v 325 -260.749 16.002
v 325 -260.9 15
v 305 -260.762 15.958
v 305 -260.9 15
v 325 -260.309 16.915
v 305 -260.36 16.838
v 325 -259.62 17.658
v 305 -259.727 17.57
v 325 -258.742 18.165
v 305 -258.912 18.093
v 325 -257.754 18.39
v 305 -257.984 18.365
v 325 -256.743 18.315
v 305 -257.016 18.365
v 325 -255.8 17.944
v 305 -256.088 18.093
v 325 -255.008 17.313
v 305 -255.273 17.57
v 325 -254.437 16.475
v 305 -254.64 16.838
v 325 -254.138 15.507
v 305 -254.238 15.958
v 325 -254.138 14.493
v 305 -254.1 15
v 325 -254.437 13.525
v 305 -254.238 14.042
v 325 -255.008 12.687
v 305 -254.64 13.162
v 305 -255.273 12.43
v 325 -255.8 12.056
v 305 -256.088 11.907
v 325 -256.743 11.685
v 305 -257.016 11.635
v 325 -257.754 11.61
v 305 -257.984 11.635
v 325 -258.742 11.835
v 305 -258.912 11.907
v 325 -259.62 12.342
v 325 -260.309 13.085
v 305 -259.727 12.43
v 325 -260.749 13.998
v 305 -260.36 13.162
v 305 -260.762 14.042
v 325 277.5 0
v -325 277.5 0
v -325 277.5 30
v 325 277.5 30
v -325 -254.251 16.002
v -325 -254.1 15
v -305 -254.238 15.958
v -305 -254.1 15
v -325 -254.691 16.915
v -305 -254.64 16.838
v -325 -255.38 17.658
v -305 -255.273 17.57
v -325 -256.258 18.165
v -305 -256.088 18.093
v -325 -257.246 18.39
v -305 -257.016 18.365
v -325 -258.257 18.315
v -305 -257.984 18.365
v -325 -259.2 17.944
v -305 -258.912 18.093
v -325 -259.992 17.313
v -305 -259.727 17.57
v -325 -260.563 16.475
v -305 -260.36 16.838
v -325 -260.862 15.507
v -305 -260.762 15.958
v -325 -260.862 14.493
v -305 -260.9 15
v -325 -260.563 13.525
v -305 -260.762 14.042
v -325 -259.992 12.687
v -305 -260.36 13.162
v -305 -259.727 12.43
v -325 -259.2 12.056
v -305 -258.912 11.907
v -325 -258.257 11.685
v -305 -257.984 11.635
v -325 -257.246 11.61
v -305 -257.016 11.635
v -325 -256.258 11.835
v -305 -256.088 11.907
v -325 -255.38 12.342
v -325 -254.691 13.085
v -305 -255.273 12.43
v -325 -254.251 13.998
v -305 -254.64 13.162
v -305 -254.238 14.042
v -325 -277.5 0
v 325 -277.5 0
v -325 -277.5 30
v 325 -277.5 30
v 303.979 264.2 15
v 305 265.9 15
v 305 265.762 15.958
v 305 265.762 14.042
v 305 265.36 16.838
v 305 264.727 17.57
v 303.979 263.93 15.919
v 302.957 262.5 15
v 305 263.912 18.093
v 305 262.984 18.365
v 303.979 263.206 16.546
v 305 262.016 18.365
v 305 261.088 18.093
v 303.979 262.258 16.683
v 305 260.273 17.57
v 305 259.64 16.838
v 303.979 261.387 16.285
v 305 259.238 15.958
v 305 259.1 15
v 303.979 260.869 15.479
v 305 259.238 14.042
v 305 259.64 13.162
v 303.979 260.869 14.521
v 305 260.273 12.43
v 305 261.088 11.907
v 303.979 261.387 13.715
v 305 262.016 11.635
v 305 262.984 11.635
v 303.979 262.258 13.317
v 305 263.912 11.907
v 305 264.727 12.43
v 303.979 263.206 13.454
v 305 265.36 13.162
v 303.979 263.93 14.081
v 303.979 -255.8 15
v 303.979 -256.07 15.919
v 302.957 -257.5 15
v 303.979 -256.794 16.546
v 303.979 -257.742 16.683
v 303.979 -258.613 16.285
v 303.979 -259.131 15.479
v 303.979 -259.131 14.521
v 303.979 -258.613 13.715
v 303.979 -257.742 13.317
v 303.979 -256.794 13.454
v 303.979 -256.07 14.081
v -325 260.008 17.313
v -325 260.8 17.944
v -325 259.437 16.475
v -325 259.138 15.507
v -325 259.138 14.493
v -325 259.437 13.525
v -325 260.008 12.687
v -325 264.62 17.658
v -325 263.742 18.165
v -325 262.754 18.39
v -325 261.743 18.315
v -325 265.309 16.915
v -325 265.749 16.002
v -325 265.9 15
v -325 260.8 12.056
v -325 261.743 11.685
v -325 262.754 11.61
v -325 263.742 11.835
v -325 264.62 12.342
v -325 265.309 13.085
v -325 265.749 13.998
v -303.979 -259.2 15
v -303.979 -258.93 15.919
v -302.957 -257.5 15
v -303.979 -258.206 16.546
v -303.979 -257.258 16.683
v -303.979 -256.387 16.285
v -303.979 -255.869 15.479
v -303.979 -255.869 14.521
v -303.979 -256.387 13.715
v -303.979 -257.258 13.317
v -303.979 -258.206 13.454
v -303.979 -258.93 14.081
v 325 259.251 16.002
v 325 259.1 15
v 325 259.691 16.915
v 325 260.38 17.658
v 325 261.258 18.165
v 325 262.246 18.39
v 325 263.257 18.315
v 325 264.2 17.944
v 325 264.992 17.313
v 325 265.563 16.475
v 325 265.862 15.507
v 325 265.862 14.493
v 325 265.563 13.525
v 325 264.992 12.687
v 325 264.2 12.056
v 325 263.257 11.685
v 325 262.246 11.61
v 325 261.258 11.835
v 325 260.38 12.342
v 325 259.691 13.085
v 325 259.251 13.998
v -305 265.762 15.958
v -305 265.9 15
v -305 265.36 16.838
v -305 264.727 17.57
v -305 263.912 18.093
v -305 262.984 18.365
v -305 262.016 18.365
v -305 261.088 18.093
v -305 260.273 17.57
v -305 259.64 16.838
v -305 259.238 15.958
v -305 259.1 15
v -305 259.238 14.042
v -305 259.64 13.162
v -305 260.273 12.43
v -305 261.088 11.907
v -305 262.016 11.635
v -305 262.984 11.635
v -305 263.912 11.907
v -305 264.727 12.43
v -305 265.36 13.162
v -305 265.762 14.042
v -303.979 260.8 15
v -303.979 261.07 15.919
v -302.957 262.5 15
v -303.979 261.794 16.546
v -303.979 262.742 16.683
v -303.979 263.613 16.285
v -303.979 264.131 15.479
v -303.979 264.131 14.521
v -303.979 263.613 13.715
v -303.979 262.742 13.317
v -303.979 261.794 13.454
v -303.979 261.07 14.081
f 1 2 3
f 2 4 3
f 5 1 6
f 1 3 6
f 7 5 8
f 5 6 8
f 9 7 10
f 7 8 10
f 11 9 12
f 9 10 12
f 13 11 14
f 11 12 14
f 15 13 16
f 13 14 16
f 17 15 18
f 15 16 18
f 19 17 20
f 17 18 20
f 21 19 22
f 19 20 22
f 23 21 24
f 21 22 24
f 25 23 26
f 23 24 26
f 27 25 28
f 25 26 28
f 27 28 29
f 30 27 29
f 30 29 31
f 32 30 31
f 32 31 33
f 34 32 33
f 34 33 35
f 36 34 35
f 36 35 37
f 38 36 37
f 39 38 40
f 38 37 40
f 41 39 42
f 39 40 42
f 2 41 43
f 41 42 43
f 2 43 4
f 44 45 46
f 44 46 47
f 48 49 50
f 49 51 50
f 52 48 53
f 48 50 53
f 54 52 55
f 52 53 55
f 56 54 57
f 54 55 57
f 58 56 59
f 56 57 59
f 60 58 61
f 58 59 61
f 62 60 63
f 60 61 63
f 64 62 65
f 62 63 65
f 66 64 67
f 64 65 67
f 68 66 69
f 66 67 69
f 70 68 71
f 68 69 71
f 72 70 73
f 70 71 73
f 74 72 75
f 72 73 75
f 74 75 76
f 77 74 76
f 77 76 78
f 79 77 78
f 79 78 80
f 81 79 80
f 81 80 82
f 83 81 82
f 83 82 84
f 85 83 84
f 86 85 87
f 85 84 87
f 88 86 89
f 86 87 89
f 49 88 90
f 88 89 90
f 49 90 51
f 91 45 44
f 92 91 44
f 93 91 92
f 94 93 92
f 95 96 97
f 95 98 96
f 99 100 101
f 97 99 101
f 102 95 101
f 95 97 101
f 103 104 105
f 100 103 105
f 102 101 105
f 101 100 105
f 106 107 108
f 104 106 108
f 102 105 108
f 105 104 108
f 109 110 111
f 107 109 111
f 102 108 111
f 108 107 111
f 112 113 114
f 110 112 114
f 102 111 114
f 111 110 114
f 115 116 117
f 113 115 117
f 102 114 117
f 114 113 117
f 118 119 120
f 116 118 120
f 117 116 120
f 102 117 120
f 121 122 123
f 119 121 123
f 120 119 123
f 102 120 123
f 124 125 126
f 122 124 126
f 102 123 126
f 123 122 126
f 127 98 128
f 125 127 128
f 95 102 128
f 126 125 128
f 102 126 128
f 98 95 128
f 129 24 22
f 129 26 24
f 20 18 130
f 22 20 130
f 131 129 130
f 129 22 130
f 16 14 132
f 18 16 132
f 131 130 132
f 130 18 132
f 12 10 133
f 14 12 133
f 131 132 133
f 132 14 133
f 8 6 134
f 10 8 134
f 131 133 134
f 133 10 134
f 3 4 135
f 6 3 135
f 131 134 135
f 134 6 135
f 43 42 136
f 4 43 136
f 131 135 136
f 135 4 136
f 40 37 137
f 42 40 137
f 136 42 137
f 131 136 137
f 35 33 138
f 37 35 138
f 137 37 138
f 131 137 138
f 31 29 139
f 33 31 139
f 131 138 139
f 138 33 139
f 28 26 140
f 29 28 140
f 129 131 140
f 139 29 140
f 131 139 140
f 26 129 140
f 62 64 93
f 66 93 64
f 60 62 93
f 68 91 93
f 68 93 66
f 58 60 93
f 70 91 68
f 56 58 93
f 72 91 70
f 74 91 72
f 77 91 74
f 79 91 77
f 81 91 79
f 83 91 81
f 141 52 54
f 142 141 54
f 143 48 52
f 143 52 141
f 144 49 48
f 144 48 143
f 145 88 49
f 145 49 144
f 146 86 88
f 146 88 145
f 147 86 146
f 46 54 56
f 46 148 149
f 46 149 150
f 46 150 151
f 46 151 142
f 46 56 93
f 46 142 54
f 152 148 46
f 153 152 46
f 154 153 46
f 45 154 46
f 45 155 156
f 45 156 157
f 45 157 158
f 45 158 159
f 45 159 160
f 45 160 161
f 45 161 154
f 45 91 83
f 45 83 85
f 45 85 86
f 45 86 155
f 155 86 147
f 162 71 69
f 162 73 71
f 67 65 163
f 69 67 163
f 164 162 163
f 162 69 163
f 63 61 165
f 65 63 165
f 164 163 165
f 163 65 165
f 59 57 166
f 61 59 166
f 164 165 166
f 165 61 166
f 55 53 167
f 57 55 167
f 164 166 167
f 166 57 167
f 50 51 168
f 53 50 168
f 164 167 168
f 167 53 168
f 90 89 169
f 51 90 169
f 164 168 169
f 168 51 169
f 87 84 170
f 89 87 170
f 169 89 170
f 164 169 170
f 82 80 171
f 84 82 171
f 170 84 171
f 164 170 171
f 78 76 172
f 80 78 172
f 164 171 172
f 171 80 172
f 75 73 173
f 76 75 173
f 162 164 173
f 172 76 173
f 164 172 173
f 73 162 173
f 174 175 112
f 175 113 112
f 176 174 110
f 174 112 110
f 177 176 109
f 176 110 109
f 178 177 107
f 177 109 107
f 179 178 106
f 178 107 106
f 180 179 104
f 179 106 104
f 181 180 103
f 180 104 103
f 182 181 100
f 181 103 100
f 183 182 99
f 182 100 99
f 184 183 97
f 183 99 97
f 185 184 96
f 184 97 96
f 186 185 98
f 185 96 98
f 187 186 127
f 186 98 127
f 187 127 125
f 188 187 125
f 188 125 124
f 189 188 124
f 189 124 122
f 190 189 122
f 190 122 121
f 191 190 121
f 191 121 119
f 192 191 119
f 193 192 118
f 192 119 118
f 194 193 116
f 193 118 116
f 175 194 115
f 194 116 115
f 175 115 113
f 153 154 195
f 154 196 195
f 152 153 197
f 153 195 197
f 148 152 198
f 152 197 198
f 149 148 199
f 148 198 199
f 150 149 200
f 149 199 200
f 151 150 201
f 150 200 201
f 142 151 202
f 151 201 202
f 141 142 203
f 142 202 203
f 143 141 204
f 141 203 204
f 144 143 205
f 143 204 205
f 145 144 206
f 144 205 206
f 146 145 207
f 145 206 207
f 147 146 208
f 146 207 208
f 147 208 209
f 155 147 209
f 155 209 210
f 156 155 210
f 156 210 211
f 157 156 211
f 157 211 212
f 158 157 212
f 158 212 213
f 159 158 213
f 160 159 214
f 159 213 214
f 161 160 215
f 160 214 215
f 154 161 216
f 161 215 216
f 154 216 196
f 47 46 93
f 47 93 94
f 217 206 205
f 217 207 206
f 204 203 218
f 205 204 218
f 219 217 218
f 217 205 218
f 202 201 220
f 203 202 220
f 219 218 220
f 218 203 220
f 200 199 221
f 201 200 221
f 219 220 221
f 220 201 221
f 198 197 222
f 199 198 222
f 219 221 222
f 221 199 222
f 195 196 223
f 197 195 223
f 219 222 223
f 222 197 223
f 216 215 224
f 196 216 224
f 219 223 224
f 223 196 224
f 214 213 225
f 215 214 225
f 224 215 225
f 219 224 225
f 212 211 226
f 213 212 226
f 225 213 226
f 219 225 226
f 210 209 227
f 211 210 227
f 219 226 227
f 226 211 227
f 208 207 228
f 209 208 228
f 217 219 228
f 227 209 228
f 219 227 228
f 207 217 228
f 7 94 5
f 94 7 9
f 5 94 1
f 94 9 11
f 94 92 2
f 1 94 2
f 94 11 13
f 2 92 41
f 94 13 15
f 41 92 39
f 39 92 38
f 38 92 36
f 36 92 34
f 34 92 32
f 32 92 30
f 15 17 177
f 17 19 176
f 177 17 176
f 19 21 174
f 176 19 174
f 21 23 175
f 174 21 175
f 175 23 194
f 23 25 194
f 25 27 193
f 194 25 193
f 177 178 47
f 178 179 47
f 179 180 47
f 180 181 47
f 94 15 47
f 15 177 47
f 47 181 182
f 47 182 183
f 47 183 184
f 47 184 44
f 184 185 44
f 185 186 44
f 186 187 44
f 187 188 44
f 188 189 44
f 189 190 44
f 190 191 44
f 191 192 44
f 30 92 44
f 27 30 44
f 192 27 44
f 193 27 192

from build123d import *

# Parameters (mm, degrees)
F0_W           = 650
F0_H           = 555
F1_DEPTH       = 30
F4_D           = 6.8
F4_DEPTH       = 20
F4_TIP         = 2.0429261047
F4_ON_F3_D     = 6.8
F4_ON_F3_DEPTH = 20
F4_ON_F3_TIP   = 2.0429261047


with BuildPart() as f1:
    # F0 (on Top) → F1 (new body)
    with BuildSketch(Plane.XY):
        Rectangle(F0_W, F0_H)
    extrude(amount=F1_DEPTH)

    # F4
    with Locations(Plane(origin=(-325, 0, 0), x_dir=(0, -1, 0), z_dir=(-1, 0, 0))):
        with Locations((257.5, 15), (-262.5, 15)):
            Hole(F4_D / 2, depth=F4_DEPTH)
            with Locations((0, 0, -(F4_DEPTH + F4_TIP / 2))):  # 118° drill point
                Cone(0, F4_D / 2, F4_TIP, mode=Mode.SUBTRACT)

    # F4 on F3
    with Locations(Plane.YZ.offset(325)):
        with Locations((262.5, 15), (-257.5, 15)):
            Hole(F4_ON_F3_D / 2, depth=F4_ON_F3_DEPTH)
            with Locations((0, 0, -(F4_ON_F3_DEPTH + F4_ON_F3_TIP / 2))):  # 118° drill point
                Cone(0, F4_ON_F3_D / 2, F4_ON_F3_TIP, mode=Mode.SUBTRACT)


solid = f1.part
